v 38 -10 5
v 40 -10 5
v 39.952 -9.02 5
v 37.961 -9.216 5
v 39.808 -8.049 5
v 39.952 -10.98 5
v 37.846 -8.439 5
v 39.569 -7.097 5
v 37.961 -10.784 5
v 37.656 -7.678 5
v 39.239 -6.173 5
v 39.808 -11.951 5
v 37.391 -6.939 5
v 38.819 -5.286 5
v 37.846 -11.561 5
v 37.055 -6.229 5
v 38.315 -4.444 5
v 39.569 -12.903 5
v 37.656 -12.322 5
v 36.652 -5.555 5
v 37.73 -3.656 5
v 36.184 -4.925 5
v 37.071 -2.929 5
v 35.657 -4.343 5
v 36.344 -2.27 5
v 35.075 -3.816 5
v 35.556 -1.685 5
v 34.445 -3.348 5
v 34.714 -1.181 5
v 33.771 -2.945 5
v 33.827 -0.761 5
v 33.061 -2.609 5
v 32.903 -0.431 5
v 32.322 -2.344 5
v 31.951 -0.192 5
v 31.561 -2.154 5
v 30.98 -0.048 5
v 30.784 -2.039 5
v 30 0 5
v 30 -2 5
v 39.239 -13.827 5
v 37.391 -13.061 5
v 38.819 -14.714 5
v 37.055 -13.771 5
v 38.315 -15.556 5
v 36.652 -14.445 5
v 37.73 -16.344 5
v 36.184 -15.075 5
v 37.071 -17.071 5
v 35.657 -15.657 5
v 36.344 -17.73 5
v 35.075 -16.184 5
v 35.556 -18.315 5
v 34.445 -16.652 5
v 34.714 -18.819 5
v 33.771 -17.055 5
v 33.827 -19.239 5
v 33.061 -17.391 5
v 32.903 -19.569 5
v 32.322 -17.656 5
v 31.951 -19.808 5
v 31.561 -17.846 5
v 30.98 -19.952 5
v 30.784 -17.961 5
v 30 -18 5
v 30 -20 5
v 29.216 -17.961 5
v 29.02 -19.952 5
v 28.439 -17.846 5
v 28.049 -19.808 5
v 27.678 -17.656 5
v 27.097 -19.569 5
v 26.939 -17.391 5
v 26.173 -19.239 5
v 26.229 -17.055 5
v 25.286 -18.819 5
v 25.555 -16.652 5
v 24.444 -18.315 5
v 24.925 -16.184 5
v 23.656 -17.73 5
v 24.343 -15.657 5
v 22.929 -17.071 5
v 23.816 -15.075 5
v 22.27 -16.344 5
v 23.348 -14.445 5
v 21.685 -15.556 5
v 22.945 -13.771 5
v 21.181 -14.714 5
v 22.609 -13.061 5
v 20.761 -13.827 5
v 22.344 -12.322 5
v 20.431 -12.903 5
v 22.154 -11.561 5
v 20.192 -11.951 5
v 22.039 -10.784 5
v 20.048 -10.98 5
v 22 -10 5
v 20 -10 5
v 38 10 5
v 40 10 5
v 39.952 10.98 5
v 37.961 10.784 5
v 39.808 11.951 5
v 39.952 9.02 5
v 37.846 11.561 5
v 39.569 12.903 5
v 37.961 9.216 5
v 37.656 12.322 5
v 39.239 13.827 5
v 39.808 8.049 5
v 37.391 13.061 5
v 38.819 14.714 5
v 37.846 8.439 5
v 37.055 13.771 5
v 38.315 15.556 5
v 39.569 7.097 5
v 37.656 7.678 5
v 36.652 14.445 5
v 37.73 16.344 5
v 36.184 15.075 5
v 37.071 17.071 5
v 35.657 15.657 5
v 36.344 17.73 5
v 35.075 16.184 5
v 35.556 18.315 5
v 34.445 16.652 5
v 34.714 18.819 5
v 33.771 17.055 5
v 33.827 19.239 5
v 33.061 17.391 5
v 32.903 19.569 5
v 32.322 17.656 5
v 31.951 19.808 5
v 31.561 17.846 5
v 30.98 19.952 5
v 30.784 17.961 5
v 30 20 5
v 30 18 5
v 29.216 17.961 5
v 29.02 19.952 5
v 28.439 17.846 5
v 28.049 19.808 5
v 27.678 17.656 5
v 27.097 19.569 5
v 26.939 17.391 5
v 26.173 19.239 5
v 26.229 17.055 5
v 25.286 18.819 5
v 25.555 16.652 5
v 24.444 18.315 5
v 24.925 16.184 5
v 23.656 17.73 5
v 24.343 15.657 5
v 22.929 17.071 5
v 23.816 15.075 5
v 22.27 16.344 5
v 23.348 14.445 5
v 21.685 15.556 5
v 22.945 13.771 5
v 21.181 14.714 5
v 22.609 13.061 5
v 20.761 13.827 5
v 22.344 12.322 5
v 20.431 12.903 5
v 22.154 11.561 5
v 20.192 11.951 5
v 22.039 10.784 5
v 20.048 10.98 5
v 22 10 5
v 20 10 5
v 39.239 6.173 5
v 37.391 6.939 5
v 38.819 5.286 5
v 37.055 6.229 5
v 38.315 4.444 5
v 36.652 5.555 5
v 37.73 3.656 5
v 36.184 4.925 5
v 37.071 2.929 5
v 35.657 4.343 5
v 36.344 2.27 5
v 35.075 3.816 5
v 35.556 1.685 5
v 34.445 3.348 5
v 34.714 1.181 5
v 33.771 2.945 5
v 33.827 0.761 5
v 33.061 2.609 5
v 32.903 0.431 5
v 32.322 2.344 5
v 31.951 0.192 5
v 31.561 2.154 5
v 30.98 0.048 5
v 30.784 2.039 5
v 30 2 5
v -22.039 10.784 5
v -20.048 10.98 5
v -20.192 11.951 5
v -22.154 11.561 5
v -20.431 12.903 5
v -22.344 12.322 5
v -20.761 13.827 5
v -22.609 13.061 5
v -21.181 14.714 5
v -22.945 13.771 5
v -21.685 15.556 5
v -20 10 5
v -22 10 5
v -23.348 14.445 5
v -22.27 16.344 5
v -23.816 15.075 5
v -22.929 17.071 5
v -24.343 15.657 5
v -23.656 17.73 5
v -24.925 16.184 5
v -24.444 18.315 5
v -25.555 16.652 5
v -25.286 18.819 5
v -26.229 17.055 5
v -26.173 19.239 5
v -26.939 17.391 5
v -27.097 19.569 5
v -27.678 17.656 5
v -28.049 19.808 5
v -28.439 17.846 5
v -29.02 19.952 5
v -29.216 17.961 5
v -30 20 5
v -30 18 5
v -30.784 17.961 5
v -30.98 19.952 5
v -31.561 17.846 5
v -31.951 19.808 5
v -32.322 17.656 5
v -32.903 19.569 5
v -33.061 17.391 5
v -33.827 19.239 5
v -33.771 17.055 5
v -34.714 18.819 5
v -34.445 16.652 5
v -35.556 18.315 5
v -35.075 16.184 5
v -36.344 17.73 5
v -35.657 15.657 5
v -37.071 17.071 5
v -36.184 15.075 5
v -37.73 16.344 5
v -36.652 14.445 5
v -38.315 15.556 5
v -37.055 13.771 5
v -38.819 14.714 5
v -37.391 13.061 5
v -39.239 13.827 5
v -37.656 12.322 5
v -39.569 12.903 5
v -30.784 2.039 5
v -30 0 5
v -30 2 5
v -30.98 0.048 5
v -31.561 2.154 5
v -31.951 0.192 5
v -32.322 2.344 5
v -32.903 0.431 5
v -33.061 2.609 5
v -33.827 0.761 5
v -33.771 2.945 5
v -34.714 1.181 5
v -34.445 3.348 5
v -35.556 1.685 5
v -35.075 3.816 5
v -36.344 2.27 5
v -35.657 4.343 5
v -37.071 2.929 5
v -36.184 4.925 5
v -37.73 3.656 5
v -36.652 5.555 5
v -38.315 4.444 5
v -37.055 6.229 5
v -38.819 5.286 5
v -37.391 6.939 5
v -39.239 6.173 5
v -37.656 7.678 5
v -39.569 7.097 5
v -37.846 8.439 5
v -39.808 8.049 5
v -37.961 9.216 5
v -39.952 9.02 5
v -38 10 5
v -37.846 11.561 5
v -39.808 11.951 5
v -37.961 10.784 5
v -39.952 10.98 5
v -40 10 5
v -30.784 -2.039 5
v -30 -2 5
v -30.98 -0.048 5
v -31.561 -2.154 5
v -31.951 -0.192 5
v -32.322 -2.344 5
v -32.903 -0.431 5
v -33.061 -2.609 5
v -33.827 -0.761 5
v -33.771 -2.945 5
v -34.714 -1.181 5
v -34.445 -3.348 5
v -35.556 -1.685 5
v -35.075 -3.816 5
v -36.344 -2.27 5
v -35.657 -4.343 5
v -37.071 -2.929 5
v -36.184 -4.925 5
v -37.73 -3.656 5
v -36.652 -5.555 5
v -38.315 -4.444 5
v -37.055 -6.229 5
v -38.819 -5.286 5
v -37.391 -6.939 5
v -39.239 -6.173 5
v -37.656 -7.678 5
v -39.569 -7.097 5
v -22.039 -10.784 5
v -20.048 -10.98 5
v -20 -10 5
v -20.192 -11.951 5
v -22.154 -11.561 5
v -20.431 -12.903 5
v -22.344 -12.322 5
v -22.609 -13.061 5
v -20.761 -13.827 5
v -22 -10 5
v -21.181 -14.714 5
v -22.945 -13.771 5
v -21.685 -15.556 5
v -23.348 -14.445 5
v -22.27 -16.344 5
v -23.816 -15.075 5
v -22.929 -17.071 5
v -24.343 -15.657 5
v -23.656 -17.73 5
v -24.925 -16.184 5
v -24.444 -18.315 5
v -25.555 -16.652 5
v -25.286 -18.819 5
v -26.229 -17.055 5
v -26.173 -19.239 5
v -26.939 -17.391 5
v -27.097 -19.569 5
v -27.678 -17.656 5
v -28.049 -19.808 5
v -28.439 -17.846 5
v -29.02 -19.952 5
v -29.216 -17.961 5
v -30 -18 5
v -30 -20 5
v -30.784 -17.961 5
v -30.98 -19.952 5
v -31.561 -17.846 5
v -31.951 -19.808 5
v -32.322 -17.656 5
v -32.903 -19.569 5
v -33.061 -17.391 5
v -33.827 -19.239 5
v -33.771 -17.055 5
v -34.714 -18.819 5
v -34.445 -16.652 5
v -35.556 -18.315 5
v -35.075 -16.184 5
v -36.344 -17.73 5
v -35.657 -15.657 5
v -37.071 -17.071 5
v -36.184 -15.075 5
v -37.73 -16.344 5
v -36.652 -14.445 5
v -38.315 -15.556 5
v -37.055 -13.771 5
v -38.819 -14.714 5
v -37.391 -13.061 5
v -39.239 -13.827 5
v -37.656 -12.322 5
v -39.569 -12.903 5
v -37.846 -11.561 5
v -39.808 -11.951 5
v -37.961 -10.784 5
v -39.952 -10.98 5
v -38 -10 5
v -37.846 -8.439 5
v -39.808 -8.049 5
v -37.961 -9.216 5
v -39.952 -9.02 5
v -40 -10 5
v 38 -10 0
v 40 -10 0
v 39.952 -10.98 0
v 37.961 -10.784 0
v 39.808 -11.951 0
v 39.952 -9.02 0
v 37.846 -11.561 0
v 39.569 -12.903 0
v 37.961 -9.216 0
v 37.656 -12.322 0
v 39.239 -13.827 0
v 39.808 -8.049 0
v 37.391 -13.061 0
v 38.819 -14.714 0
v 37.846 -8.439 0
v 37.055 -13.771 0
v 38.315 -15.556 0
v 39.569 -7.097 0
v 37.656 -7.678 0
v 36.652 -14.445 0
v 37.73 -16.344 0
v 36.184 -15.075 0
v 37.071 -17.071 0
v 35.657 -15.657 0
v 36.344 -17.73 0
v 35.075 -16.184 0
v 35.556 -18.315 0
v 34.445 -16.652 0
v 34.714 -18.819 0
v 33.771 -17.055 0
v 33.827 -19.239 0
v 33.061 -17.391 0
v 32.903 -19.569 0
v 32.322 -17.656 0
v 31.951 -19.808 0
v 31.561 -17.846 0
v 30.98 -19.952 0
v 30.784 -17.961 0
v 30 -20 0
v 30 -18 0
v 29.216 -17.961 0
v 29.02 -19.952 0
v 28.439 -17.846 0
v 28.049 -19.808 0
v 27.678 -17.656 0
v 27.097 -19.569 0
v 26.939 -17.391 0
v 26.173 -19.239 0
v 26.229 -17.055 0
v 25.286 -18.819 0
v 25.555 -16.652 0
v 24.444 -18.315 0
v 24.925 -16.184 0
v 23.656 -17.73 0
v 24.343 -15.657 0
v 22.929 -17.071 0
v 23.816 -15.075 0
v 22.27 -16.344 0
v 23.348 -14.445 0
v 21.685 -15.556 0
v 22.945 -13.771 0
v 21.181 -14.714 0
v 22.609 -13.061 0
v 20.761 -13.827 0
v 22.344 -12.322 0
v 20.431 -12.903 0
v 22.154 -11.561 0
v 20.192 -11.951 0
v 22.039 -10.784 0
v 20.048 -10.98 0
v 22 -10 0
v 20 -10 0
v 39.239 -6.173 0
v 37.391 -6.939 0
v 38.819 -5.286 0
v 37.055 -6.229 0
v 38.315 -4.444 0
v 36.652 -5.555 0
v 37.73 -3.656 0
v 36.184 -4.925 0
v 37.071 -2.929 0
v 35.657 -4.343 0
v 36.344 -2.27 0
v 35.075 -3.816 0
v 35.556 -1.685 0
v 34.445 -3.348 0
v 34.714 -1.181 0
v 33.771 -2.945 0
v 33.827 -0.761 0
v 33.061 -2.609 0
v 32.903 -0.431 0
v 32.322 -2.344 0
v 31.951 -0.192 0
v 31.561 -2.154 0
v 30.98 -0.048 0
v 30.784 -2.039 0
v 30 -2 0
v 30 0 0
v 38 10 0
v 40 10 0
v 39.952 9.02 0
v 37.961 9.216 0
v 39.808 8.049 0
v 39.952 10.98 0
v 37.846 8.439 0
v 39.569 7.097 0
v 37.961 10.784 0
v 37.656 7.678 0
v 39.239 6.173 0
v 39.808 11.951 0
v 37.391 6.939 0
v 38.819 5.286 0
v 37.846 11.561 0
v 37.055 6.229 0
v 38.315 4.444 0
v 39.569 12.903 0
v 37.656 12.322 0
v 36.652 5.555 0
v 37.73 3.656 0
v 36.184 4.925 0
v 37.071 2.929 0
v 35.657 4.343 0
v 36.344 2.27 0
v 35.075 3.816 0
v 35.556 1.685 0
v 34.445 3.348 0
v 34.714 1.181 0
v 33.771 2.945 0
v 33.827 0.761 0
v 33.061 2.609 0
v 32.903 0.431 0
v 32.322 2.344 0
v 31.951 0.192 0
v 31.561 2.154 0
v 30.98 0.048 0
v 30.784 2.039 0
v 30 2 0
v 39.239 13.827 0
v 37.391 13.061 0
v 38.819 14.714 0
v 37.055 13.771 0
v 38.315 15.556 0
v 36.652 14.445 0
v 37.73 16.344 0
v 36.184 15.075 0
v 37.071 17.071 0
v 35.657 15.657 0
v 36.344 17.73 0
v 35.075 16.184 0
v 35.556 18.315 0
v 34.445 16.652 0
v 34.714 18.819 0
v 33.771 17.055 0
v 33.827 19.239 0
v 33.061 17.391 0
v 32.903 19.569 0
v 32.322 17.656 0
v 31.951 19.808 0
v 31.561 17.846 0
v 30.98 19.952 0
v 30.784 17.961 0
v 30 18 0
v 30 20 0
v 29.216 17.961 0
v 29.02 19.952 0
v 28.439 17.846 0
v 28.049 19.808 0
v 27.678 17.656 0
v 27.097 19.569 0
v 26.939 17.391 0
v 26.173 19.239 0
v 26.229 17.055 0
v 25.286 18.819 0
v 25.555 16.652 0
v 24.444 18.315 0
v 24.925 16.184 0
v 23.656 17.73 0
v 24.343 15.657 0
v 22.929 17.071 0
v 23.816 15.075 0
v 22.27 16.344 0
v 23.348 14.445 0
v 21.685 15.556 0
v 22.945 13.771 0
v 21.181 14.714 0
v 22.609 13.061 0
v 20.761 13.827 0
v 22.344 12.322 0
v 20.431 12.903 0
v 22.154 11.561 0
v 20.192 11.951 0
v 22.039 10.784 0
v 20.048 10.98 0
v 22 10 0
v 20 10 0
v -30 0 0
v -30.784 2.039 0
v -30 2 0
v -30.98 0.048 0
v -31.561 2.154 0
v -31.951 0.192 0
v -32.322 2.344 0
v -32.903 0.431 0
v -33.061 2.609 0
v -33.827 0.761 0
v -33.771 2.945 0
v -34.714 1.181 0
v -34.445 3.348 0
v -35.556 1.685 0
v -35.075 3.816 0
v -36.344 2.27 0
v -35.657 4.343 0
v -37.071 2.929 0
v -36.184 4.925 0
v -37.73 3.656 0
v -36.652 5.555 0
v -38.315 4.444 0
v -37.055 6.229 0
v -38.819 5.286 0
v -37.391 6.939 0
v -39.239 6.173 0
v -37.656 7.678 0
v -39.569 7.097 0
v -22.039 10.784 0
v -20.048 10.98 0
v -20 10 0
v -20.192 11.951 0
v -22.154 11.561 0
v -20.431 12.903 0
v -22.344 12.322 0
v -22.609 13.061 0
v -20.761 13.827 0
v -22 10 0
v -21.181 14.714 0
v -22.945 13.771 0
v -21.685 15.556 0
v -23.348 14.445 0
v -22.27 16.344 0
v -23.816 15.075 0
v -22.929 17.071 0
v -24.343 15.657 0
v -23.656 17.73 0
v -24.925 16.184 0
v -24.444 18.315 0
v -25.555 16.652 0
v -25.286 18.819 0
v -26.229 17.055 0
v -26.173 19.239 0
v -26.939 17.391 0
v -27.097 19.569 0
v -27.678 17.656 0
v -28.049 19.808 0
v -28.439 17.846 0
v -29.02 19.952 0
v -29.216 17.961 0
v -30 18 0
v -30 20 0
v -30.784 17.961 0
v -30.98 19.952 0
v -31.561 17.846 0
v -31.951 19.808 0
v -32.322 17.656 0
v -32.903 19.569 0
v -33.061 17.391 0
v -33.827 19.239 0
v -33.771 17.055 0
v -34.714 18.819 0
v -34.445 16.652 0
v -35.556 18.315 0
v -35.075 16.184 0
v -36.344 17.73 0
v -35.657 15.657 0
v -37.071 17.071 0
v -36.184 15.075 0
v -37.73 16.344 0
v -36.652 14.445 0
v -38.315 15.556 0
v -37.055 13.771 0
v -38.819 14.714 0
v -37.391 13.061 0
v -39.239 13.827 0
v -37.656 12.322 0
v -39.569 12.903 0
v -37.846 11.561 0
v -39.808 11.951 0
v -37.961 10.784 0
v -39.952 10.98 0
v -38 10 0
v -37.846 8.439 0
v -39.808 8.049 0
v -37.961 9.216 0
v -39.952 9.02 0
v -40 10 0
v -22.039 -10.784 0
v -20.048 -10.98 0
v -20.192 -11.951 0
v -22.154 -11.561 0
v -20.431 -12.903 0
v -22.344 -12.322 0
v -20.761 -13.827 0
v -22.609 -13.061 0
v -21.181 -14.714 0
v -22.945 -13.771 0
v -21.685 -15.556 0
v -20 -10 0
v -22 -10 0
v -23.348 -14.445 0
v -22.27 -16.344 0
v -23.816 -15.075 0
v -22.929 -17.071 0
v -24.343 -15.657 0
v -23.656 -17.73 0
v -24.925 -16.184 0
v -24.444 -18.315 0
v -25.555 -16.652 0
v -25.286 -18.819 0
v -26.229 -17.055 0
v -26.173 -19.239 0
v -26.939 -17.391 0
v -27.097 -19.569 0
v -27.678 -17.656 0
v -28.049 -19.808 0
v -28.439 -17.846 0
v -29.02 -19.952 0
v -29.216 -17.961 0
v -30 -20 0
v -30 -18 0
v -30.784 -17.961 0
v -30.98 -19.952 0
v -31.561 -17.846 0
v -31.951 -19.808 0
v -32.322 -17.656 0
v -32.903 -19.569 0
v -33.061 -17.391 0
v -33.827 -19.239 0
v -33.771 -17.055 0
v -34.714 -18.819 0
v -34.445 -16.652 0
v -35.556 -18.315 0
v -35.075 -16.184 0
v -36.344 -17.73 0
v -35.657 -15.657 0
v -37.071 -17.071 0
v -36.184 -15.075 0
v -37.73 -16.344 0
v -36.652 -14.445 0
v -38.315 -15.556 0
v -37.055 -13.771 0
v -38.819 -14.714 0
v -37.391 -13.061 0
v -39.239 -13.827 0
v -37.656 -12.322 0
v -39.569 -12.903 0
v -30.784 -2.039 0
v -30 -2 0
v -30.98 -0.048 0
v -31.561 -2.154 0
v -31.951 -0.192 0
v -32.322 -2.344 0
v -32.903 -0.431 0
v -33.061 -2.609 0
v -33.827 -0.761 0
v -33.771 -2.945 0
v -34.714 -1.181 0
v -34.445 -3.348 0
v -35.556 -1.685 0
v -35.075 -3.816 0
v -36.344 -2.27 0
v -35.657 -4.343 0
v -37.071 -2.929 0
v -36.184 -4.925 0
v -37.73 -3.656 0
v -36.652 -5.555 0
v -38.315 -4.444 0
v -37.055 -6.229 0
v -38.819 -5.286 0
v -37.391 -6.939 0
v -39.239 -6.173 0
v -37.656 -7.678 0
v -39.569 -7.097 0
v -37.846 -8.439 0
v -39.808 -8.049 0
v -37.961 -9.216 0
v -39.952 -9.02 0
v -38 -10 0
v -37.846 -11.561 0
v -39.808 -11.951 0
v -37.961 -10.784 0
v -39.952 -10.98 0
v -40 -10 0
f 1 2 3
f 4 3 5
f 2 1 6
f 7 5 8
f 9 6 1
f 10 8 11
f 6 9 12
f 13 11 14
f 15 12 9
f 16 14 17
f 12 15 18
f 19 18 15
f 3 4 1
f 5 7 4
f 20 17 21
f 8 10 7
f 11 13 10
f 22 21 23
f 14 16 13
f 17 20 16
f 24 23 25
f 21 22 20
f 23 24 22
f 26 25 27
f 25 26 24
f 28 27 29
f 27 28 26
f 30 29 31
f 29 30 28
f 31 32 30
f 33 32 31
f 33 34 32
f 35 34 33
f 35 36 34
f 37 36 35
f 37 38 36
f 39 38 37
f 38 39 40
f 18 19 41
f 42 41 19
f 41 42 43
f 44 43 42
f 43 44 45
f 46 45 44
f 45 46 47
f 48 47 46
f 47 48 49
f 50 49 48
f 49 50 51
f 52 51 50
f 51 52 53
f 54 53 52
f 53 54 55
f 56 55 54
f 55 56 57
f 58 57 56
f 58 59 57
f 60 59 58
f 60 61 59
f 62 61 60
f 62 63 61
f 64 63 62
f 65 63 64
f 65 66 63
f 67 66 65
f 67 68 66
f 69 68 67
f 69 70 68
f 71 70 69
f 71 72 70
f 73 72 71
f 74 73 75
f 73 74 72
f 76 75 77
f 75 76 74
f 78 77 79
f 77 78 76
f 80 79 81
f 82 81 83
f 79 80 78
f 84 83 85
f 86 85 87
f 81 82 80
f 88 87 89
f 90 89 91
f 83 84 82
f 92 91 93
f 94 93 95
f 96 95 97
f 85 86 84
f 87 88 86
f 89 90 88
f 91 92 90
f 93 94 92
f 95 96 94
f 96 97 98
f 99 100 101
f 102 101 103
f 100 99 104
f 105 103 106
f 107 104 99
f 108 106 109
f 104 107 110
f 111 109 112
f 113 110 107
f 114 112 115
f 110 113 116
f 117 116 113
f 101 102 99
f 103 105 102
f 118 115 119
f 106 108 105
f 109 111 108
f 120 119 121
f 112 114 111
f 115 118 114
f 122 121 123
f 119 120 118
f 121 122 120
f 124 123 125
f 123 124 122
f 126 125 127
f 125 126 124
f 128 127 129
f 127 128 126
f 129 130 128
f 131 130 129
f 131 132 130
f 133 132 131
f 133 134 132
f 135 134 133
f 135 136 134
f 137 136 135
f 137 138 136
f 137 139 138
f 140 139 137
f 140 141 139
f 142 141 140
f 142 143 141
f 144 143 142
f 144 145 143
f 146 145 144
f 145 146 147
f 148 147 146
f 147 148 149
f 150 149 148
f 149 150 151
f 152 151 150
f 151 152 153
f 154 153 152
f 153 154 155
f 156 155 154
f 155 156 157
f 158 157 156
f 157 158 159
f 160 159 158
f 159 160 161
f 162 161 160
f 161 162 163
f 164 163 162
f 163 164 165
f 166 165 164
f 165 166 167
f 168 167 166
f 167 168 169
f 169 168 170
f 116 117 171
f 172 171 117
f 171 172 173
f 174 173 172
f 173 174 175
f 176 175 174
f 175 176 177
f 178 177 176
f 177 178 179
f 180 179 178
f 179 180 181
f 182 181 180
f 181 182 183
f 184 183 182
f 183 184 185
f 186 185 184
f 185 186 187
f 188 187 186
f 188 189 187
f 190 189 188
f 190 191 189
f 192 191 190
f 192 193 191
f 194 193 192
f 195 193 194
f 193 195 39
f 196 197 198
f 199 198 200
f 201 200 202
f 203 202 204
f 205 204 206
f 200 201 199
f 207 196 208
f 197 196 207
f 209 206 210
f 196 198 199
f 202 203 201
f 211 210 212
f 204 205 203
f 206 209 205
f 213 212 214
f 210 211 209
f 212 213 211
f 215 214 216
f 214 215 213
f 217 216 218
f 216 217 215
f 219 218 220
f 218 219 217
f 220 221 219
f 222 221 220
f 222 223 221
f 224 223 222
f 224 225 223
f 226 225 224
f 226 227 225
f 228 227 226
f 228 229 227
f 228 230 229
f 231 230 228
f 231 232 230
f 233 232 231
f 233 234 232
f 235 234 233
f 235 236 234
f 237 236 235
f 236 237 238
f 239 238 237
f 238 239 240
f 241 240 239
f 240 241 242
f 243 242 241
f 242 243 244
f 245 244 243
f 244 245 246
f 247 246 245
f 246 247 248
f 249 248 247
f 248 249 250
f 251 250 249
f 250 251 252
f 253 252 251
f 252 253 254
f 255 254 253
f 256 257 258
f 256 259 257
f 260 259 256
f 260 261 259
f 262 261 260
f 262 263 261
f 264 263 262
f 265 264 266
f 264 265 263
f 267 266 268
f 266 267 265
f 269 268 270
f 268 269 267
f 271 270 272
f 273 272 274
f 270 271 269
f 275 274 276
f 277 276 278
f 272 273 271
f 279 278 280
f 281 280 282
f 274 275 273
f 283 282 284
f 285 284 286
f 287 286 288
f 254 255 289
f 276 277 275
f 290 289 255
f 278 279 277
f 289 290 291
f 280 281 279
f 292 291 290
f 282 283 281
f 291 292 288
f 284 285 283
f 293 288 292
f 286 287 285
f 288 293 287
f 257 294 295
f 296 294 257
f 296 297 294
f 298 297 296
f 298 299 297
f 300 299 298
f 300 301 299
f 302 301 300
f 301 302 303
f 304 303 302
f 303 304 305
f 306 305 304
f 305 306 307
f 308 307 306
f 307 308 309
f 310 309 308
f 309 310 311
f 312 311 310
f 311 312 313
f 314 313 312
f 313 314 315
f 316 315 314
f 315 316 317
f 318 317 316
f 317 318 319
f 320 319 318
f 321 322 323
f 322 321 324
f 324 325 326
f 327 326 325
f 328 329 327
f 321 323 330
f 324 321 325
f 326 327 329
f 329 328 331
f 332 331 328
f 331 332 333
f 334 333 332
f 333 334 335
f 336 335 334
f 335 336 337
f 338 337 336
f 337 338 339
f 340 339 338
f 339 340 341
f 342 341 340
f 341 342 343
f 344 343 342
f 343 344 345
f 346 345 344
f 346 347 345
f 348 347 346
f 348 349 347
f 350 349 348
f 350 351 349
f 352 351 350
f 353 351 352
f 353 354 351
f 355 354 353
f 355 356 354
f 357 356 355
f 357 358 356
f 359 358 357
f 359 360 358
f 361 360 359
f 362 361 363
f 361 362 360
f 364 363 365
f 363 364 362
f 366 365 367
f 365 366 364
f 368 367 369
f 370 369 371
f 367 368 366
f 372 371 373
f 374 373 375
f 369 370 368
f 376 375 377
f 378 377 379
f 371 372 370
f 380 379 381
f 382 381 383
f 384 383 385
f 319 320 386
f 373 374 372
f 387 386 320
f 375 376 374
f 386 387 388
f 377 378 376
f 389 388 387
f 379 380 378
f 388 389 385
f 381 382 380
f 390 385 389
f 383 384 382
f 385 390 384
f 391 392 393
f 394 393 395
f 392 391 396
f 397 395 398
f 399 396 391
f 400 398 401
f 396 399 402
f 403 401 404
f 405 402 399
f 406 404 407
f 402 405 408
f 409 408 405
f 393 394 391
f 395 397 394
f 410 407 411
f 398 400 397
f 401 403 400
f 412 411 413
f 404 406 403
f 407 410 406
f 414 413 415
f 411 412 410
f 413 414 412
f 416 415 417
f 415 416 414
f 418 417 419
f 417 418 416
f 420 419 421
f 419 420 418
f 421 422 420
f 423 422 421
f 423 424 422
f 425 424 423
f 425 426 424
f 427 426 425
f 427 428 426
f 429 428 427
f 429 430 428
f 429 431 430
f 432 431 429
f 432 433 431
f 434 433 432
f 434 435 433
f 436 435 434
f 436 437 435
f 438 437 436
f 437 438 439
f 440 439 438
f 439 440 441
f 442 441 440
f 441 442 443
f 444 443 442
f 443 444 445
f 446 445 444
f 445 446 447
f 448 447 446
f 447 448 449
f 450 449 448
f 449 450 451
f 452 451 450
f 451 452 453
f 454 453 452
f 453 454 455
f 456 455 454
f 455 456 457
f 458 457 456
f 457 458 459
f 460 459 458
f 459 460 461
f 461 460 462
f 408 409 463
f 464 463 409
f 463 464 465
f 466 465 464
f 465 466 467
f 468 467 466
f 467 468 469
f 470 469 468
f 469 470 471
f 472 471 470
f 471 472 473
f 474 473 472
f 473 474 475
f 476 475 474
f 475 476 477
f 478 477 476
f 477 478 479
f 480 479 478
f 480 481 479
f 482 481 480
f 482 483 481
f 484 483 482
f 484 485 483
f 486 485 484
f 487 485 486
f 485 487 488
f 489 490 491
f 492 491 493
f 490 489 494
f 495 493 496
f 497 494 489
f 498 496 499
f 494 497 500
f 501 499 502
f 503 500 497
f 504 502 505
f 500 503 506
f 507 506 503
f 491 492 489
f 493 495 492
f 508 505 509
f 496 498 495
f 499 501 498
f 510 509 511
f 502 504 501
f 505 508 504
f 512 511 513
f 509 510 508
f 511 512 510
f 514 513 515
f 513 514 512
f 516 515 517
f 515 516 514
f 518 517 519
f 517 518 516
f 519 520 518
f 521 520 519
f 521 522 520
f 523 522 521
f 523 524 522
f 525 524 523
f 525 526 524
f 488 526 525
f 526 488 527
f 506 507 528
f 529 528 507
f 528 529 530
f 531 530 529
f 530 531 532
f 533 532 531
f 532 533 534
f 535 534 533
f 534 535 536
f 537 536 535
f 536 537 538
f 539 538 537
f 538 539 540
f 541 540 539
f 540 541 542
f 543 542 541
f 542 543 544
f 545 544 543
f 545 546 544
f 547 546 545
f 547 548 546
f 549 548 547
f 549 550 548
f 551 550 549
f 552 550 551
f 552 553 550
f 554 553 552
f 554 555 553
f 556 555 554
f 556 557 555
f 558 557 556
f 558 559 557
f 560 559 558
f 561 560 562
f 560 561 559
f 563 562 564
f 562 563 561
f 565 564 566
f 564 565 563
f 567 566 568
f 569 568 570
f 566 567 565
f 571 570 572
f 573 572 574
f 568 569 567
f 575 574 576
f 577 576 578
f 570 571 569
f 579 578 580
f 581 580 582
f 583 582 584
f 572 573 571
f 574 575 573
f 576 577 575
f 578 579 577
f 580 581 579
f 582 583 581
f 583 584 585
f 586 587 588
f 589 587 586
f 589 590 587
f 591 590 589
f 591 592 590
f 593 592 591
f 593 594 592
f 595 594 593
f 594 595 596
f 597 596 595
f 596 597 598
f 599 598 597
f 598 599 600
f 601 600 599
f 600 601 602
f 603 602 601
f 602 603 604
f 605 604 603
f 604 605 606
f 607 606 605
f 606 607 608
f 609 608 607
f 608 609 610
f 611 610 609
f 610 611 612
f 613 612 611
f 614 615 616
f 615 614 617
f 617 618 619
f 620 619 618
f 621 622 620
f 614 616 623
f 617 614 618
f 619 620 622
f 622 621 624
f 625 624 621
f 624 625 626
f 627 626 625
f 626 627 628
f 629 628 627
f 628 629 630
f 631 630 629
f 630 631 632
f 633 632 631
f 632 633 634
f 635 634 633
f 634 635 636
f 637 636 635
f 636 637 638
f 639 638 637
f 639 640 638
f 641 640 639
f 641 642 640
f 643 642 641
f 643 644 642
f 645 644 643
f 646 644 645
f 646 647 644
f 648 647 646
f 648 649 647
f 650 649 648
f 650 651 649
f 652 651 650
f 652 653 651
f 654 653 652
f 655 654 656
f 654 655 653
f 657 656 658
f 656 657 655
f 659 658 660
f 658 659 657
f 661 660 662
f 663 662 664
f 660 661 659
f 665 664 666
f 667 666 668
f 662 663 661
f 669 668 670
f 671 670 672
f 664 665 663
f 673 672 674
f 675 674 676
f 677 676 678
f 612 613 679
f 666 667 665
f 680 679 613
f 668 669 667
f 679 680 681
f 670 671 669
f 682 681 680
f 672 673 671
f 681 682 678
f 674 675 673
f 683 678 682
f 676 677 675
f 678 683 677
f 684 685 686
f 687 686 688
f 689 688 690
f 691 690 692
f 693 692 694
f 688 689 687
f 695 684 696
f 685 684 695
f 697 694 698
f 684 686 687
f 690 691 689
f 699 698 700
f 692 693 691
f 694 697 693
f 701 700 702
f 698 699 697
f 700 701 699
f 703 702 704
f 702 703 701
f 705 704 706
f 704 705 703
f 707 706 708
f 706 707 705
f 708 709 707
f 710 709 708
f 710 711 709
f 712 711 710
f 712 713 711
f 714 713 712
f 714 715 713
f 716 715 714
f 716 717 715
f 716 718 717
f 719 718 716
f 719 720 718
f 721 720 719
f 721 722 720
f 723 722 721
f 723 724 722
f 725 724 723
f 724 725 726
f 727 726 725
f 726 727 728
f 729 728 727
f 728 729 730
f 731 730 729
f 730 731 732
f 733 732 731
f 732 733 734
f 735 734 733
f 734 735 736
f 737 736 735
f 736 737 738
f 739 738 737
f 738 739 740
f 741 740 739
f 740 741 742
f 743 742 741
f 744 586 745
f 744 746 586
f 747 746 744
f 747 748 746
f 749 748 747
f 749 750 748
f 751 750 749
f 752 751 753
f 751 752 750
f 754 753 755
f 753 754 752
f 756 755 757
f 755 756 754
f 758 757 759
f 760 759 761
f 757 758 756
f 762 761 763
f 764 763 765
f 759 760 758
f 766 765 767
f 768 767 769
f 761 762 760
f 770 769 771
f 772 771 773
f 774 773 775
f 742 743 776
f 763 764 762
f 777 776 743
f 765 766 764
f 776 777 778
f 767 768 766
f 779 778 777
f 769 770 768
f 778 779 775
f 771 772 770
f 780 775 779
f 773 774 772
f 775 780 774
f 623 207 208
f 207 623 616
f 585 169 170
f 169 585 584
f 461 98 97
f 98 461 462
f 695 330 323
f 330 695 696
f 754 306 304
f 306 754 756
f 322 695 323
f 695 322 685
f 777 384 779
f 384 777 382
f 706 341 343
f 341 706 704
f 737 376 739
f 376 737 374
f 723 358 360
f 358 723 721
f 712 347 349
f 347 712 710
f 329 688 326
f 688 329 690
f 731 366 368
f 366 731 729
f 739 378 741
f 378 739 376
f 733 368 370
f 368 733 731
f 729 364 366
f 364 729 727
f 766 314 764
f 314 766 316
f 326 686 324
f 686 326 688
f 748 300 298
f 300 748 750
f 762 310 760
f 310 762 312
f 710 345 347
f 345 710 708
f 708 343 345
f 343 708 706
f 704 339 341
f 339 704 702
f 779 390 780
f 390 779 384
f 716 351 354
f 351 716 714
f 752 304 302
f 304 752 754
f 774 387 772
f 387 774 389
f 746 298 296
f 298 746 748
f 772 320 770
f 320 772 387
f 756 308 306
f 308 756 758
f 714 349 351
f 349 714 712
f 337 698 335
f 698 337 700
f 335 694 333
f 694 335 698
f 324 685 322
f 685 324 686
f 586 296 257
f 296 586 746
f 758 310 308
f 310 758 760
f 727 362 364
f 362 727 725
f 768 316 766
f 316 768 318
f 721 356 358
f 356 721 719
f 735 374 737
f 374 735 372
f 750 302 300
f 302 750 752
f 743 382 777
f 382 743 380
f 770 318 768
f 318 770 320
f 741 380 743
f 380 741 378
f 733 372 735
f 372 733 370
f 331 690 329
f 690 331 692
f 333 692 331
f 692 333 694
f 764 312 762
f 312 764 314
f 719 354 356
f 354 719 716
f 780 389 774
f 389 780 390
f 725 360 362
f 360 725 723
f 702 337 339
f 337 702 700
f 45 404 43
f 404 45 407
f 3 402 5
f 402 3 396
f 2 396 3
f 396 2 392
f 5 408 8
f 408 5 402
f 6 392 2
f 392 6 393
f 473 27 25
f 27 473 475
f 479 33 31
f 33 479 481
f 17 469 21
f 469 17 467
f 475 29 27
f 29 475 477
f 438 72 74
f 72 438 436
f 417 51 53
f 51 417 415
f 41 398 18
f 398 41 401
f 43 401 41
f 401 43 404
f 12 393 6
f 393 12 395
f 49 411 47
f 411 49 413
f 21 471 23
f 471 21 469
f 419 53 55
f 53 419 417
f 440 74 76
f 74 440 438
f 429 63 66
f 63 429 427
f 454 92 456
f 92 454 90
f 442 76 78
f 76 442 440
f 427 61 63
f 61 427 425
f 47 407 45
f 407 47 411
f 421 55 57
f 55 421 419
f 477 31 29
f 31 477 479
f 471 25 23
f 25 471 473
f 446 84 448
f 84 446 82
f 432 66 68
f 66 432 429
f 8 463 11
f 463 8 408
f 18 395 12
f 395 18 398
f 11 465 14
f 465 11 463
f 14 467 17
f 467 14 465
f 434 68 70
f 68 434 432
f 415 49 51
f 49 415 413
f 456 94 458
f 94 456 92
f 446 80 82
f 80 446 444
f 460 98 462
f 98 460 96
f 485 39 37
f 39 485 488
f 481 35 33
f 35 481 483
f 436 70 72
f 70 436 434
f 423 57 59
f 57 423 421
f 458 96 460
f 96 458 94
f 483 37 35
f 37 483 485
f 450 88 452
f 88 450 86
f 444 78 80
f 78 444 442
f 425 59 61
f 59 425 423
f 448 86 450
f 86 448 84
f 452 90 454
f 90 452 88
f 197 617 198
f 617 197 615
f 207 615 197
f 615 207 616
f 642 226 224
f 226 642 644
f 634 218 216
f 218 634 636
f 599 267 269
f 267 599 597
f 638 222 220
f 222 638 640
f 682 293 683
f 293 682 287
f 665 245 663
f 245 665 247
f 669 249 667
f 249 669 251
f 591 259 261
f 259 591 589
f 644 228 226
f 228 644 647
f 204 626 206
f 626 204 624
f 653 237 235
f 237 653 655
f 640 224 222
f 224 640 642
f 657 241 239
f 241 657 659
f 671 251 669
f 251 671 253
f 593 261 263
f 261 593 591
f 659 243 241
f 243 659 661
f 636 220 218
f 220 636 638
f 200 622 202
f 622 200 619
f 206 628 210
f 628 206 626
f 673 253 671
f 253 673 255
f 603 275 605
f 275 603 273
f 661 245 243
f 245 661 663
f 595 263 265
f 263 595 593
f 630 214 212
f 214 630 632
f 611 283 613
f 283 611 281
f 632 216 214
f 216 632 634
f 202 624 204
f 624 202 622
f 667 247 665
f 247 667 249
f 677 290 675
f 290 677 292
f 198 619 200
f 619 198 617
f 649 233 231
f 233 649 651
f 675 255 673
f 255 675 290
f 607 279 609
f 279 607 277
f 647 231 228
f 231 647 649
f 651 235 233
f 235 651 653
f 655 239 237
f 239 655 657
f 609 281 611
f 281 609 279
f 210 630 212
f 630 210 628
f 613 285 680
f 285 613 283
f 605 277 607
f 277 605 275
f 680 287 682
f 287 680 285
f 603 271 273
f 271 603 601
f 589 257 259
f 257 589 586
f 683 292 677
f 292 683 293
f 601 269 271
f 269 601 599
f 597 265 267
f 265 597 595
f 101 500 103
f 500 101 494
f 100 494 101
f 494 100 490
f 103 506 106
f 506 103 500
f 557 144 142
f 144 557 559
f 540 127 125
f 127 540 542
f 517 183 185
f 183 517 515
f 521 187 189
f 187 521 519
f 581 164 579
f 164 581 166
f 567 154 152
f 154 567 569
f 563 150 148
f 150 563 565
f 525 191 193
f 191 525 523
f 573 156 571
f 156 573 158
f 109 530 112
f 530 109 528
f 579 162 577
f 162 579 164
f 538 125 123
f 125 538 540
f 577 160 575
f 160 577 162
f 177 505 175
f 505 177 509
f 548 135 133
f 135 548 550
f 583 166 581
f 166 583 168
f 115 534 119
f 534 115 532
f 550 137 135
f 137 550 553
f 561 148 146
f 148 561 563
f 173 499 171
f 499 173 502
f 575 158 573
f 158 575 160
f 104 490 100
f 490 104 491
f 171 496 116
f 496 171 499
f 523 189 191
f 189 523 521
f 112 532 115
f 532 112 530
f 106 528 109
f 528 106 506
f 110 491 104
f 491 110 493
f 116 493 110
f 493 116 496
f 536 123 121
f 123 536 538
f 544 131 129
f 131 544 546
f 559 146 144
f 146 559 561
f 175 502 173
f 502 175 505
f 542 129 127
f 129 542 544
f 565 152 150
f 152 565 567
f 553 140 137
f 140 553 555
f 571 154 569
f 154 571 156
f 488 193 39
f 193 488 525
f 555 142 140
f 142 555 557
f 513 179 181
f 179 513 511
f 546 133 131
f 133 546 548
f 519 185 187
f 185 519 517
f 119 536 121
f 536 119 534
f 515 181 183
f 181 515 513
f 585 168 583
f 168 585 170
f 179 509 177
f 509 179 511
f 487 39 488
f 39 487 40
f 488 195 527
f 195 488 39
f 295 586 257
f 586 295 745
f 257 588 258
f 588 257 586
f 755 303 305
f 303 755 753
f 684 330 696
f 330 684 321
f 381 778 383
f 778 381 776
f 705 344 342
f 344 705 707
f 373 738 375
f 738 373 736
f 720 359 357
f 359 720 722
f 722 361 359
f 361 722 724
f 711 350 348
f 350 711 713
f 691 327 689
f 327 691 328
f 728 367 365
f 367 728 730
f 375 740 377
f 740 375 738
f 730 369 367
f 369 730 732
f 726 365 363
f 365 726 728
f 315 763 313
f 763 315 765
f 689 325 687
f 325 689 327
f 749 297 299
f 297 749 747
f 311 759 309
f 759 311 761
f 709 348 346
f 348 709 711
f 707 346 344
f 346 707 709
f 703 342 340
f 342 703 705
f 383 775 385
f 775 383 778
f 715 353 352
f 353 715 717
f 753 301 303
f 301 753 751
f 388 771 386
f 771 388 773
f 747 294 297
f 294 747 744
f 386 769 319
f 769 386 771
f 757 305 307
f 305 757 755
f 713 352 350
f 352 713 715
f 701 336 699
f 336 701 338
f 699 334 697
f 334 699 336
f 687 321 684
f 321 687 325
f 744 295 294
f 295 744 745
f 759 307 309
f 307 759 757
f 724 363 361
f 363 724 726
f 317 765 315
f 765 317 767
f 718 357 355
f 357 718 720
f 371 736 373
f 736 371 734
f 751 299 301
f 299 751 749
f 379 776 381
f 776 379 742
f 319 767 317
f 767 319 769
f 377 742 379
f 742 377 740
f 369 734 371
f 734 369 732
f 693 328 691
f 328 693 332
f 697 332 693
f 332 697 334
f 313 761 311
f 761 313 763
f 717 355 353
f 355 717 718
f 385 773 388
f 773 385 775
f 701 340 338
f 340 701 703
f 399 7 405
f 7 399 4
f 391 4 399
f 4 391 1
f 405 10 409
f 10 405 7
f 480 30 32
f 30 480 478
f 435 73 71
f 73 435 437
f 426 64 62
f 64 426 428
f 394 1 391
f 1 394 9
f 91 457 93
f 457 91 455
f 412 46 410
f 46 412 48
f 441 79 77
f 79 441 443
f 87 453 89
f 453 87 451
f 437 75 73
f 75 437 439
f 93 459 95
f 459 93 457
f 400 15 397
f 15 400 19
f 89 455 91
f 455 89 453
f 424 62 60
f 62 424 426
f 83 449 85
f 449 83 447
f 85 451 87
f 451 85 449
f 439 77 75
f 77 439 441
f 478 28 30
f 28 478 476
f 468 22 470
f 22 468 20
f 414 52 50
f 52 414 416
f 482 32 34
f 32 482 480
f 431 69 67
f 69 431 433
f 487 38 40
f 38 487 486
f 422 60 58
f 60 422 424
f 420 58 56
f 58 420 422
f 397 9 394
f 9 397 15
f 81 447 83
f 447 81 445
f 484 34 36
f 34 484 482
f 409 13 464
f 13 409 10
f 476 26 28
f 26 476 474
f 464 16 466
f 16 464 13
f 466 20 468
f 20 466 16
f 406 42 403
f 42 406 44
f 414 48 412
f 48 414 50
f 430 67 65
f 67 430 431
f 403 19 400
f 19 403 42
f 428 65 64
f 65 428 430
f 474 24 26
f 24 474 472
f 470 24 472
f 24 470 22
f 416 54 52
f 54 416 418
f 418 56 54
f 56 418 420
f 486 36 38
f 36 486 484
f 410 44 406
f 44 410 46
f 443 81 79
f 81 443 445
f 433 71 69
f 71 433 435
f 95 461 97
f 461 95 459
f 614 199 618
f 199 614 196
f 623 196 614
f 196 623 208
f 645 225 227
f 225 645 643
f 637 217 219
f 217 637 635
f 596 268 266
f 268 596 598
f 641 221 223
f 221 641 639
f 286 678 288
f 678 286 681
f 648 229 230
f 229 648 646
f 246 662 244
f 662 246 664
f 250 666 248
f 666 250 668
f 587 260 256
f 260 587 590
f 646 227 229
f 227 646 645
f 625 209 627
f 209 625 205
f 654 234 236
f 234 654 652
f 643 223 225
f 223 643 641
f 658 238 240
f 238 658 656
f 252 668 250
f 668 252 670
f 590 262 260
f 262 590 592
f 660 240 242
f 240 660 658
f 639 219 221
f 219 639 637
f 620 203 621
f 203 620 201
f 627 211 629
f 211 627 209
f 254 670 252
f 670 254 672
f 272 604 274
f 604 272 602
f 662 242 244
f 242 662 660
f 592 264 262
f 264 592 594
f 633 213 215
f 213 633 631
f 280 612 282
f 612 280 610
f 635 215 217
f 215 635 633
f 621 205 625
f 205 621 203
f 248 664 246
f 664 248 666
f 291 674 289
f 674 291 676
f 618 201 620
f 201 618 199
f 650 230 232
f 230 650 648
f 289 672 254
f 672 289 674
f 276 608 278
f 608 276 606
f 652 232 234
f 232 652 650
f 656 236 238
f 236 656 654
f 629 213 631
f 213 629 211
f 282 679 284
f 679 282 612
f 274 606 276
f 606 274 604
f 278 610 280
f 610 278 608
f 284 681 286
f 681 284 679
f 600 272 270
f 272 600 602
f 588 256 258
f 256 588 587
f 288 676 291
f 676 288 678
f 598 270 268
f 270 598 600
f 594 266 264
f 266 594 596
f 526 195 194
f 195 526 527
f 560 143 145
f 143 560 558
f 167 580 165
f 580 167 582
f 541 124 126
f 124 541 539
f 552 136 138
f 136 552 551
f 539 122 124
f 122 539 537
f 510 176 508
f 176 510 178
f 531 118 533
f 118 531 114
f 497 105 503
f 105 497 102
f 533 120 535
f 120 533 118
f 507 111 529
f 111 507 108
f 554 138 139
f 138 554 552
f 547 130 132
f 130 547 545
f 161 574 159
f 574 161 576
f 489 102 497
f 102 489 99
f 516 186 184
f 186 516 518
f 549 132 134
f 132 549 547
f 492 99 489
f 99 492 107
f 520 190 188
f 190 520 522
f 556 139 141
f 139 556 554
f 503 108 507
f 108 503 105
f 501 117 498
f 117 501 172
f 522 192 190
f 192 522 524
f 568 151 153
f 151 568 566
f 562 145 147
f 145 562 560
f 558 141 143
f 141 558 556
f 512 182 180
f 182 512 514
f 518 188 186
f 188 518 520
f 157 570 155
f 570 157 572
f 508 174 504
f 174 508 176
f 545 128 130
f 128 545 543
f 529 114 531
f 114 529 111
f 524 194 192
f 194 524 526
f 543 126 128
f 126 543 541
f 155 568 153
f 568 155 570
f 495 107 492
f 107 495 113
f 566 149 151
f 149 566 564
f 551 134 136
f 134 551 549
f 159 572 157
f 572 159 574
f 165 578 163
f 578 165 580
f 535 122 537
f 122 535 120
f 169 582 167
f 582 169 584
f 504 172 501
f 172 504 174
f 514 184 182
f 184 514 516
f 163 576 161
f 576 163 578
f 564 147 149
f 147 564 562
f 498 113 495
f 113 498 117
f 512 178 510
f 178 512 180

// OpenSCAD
module d_connector() {
    difference() {
        union() {
            // Main body
            translate([-30, -10, 0])
            cube([60, 20, 5]);

            // Rounded edges
            translate([-30, -10, 0])
            cylinder(h=5, r=10, $fn=64);
            translate([30, -10, 0])
            cylinder(h=5, r=10, $fn=64);
            translate([-30, 10, 0])
            cylinder(h=5, r=10, $fn=64);
            translate([30, 10, 0])
            cylinder(h=5, r=10, $fn=64);
        }
        
        // Cut out the inner part to form the D shape
        translate([-30, -10, -1])
        cube([60, 20, 6]);
        translate([-30, -10, 0])
        cylinder(h=6, r=8, $fn=64);
        translate([30, -10, 0])
        cylinder(h=6, r=8, $fn=64);
        translate([-30, 10, 0])
        cylinder(h=6, r=8, $fn=64);
        translate([30, 10, 0])
        cylinder(h=6, r=8, $fn=64);
    }
}

d_connector();
